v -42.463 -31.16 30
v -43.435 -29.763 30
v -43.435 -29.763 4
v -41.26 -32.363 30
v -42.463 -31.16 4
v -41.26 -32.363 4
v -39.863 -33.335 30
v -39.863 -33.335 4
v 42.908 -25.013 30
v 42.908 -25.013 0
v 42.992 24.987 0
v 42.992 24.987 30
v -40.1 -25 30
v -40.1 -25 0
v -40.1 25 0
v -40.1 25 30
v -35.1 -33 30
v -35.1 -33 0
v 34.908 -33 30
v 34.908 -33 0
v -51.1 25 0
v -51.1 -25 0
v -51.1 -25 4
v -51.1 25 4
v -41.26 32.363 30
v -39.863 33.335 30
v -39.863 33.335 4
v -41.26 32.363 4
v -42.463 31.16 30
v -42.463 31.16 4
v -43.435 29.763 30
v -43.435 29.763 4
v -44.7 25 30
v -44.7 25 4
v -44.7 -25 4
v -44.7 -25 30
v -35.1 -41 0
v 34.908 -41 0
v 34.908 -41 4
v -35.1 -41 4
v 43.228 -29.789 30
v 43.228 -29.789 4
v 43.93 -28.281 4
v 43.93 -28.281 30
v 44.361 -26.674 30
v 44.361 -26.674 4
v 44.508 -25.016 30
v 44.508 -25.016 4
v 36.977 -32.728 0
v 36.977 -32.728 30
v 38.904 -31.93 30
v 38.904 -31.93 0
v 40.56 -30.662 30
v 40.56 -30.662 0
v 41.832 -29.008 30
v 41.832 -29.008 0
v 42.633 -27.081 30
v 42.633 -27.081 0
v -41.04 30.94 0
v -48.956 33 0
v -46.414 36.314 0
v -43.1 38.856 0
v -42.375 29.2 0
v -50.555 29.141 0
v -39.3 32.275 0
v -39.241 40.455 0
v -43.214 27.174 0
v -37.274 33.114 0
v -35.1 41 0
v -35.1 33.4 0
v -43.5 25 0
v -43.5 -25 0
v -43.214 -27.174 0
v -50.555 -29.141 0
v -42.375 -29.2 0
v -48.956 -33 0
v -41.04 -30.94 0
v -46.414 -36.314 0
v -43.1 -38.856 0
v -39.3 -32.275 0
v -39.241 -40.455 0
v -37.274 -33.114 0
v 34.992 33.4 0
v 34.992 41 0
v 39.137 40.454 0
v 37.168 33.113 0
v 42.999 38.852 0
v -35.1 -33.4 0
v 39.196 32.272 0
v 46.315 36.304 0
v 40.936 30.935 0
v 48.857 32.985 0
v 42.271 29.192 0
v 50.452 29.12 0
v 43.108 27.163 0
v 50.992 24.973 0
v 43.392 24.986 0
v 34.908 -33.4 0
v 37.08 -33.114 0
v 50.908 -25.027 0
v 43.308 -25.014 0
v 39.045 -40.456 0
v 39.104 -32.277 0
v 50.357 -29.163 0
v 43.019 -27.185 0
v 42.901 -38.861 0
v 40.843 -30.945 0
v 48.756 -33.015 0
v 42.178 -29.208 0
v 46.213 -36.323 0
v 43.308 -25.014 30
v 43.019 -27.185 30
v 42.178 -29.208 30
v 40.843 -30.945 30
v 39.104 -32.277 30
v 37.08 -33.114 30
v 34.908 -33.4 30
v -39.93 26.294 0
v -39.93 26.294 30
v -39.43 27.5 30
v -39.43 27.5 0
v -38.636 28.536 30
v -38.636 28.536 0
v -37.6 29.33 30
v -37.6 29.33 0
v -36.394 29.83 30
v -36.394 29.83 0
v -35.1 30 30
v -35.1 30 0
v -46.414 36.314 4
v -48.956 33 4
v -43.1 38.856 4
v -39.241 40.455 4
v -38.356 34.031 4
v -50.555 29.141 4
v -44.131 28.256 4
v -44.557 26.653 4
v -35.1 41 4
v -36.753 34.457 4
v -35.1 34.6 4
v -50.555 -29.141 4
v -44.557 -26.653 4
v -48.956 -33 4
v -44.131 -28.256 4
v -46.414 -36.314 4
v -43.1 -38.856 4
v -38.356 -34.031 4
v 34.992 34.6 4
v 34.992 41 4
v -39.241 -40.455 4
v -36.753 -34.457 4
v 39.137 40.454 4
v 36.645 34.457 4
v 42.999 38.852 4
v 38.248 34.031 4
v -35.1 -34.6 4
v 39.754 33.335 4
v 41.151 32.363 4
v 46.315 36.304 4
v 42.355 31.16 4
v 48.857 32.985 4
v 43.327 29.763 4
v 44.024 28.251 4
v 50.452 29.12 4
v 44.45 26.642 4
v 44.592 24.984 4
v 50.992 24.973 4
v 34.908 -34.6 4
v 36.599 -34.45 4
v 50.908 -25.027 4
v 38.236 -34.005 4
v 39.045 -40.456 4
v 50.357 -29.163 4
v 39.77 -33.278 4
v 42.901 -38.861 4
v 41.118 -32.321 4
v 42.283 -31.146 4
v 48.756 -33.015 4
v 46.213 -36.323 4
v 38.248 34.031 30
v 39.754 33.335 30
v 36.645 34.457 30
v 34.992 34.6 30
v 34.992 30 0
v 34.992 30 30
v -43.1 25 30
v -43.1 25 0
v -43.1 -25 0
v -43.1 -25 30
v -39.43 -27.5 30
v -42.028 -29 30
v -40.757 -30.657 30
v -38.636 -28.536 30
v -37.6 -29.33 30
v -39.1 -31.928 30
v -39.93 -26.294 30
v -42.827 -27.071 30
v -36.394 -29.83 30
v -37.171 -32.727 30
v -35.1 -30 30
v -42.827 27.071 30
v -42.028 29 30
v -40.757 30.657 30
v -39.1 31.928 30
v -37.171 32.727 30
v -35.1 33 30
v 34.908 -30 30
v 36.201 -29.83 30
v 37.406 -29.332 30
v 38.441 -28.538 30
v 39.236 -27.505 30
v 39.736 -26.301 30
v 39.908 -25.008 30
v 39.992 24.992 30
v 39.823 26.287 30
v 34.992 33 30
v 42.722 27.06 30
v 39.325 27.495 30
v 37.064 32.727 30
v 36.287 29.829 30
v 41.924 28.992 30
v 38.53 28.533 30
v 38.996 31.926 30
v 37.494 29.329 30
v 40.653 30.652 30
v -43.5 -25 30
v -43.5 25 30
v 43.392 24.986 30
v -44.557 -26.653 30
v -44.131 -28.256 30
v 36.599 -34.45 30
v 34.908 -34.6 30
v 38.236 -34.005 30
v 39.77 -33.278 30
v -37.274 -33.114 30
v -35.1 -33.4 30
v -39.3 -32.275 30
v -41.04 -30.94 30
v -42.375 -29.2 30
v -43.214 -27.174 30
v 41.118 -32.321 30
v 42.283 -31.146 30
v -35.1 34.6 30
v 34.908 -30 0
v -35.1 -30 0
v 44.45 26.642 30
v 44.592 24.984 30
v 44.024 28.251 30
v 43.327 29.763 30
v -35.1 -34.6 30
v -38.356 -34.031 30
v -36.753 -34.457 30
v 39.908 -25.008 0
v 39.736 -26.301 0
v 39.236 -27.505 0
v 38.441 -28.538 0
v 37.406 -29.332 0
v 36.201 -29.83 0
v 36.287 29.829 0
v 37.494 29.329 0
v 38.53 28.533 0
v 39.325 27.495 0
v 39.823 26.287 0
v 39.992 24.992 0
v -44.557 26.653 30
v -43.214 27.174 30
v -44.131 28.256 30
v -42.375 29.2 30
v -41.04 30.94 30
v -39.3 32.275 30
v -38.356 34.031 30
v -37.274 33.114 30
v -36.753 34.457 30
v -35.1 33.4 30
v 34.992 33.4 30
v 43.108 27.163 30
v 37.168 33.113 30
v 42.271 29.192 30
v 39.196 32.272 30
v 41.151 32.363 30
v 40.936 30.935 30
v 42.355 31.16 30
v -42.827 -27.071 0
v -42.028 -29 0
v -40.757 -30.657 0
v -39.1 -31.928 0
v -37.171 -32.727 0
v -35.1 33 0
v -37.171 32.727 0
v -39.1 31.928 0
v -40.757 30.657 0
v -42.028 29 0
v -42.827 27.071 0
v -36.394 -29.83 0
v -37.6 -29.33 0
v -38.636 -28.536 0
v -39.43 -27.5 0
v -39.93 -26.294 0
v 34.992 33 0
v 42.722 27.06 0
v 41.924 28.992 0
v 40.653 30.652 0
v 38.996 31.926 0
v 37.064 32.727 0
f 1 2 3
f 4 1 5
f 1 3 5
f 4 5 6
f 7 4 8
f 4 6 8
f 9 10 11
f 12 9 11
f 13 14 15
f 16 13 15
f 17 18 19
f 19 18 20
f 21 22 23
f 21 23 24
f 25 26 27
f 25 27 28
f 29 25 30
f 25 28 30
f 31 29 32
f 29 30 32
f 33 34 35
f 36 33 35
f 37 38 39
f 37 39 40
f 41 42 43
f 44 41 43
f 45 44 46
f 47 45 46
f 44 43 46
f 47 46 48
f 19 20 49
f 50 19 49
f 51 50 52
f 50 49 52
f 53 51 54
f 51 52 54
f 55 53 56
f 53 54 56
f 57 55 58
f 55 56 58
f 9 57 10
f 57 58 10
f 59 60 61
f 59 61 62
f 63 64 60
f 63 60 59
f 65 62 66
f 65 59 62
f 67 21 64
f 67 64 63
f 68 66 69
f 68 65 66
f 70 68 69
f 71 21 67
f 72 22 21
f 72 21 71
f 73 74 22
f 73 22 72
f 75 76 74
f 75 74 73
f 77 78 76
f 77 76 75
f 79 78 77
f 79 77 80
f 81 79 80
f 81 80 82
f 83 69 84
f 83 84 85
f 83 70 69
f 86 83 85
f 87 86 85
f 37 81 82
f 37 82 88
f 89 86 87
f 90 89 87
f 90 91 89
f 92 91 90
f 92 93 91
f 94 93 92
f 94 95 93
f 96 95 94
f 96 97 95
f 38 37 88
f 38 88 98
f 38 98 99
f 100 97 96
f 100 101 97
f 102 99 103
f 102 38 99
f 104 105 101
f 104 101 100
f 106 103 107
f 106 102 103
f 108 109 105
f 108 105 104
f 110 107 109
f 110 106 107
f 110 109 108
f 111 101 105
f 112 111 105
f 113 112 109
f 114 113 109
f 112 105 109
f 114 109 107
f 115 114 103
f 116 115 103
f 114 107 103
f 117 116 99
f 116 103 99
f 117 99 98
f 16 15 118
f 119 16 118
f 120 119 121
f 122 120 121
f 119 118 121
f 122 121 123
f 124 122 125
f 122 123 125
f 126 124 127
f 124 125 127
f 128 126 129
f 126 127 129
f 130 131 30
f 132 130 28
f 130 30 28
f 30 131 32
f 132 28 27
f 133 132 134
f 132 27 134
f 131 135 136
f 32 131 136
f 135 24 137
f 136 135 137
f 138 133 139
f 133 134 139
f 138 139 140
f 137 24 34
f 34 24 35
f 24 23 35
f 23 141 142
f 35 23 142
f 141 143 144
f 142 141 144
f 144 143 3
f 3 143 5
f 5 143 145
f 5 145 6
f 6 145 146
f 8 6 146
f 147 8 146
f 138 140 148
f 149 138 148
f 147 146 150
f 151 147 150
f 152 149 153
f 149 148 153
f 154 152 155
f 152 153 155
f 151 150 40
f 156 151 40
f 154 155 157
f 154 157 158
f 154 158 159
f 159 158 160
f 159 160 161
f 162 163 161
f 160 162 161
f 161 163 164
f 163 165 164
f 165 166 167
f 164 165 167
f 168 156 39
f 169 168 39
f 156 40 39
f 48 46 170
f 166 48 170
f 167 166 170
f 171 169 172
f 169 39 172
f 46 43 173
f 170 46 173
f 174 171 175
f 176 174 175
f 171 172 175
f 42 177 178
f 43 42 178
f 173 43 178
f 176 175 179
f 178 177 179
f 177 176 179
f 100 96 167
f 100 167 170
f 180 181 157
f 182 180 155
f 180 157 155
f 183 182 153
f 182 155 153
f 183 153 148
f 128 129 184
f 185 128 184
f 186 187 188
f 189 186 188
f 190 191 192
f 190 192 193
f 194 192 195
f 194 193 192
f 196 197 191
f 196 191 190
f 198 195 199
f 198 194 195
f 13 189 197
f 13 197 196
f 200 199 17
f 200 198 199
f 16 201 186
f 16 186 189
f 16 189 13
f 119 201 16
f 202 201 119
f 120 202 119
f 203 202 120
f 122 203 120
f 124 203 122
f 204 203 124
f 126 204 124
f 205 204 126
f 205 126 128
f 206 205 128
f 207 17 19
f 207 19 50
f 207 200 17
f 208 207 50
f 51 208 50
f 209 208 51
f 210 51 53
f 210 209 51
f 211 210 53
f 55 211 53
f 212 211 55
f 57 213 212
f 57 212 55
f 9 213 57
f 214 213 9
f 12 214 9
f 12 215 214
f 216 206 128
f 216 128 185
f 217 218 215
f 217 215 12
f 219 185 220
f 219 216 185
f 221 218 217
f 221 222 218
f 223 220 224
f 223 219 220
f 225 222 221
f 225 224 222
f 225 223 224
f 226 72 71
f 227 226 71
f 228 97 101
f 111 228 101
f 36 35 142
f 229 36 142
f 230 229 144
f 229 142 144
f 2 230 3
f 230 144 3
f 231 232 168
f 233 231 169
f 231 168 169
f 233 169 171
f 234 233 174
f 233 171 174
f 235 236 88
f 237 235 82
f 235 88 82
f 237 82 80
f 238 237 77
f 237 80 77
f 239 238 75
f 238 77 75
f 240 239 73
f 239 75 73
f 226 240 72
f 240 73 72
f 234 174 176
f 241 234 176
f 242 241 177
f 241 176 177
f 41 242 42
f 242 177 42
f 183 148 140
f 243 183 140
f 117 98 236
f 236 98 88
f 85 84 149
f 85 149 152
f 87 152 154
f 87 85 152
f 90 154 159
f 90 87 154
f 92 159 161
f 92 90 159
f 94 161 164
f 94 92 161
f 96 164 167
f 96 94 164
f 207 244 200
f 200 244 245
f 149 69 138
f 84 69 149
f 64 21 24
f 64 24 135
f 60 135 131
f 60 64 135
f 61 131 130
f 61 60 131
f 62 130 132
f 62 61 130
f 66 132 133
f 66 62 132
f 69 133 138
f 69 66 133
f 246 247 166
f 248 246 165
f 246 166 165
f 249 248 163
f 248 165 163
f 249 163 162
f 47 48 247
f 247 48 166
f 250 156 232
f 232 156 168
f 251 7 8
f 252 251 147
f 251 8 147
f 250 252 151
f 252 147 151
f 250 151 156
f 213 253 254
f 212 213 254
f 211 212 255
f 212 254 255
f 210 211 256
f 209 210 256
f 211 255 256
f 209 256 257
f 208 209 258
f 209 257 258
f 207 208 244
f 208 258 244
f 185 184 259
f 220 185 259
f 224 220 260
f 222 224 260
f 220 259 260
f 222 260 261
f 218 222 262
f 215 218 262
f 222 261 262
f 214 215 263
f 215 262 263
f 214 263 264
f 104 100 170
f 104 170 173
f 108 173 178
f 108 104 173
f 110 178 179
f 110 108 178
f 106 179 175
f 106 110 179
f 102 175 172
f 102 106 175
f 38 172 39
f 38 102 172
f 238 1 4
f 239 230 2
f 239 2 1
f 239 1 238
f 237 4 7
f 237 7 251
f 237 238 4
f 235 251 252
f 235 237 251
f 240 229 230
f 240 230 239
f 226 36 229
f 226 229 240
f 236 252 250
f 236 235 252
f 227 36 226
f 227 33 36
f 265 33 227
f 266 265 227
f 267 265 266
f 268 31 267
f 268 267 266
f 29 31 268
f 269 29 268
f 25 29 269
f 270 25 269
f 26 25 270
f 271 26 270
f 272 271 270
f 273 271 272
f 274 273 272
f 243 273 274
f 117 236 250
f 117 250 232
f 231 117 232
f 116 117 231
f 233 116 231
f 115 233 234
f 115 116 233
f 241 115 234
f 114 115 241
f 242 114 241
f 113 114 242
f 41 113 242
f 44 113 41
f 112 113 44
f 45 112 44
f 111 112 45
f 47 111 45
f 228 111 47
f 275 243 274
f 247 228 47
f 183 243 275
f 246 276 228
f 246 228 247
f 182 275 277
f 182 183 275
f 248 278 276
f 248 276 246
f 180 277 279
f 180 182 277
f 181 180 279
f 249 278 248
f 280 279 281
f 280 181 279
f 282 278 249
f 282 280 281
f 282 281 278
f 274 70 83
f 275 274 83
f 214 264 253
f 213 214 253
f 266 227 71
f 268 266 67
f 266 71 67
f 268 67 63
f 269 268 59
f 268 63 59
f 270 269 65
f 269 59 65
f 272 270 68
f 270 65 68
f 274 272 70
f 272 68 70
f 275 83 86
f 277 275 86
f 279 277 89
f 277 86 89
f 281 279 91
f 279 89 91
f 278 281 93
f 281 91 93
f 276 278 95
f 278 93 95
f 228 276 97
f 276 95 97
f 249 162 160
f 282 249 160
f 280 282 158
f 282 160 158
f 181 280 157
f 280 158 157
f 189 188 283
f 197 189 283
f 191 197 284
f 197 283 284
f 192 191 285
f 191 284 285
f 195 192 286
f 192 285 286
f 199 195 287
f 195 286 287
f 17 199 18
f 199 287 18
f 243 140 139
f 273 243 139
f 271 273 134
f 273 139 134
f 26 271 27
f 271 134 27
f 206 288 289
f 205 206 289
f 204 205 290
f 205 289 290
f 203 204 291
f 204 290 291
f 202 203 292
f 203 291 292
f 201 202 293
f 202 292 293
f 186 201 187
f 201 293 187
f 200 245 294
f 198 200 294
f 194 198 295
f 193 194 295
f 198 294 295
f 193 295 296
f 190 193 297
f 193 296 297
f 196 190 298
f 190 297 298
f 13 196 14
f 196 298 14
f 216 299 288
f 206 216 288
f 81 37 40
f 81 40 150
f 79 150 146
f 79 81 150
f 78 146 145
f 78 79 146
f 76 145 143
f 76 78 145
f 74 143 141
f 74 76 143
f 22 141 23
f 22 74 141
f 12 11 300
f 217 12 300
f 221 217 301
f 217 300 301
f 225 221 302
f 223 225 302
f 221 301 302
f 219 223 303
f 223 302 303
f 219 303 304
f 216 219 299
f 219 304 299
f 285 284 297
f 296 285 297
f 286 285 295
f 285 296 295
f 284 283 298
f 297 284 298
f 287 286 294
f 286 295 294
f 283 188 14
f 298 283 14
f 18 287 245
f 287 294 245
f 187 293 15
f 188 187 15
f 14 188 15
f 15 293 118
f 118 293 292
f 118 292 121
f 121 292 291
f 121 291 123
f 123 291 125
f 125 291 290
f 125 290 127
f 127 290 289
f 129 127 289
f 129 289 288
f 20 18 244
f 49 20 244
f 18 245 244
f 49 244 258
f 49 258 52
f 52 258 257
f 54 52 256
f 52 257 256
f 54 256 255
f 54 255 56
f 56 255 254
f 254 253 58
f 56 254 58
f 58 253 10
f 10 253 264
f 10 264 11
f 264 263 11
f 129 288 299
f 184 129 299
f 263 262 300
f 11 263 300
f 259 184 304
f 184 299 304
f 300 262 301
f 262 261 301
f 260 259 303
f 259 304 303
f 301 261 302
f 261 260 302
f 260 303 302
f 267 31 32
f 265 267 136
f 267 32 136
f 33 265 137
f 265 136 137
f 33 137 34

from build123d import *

# Parameters (mm, degrees)
F1_DEPTH = 30
F2_DEPTH = 30
F4_DEPTH = 4


# Not quite as in the source:
# - a feature of the source that left no trace in its solid (it failed there, or was rolled back) is left out


with BuildPart() as f1:
    # F0 (on Top) → F1 (new body)
    with BuildSketch(Plane.XY):
        with BuildLine():
            Line((34.9916597222, 33), (-35.1, 33))
            ThreePointArc((-35.1, 33), (-40.7568542495, 30.6568542495), (-43.1, 25))
            Line((-43.1, 25), (-43.1, -25))
            ThreePointArc((-43.1, -25), (-40.7568542495, -30.6568542495), (-35.1, -33))
            Line((-35.1, -33), (34.9083263889, -33))
            ThreePointArc((34.9083263889, -33), (40.5604646339, -30.6615663256), (42.9083152778, -25.0133333148))
            Line((42.9083152778, -25.0133333148), (42.9916486111, 24.9866666852))
            ThreePointArc((42.9916486111, 24.9866666852), (40.6532260478, 30.652138245), (34.9916597222, 33))
        make_face()
        with BuildLine():
            Line((34.9083263889, -30), (-35.1, -30))
            ThreePointArc((-35.1, -30), (-38.6355339059, -28.5355339059), (-40.1, -25))
            Line((-40.1, -25), (-40.1, 25))
            ThreePointArc((-40.1, 25), (-38.6355339059, 28.5355339059), (-35.1, 30))
            Line((-35.1, 30), (34.9916597222, 30))
            ThreePointArc((34.9916597222, 30), (38.5301386757, 28.5325864031), (39.9916527778, 24.9916666782))
            Line((39.9916527778, 24.9916666782), (39.9083194445, -25.0083333218))
            ThreePointArc((39.9083194445, -25.0083333218), (38.440912792, -28.5384789535), (34.9083263889, -30))
        make_face(mode=Mode.SUBTRACT)
    extrude(amount=F1_DEPTH)


with BuildPart() as f2:
    # F0 (on Top) → F2 (new body)
    with BuildSketch(Plane.XY):
        with BuildLine():
            ThreePointArc((-43.4353358825, 29.7625807841), (-41.1644660941, 31.0644660941), (-39.8625807841, 33.3353358825))
            ThreePointArc((-39.8625807841, 33.3353358825), (-41.8882250994, 31.7882250994), (-43.4353358825, 29.7625807841))
        make_face()
        with BuildLine():
            ThreePointArc((-39.8625807841, -33.3353358825), (-41.1644660941, -31.0644660941), (-43.4353358825, -29.7625807841))
            ThreePointArc((-43.4353358825, -29.7625807841), (-41.8882250994, -31.7882250994), (-39.8625807841, -33.3353358825))
        make_face()
        with BuildLine():
            ThreePointArc((43.3269979462, 29.7625766863), (41.7798801076, 31.7882298134), (39.7542248316, 33.3353448386))
            ThreePointArc((39.7542248316, 33.3353448386), (41.0561149382, 31.0644636388), (43.3269979462, 29.7625766863))
        make_face()
        with BuildLine():
            ThreePointArc((39.7695232115, -33.2782102807), (41.7258186338, -31.7588312222), (43.228235626, -29.7894791247))
            ThreePointArc((43.228235626, -29.7894791247), (41.040869178, -31.0797754051), (39.7695232115, -33.2782102807))
        make_face()
        with BuildLine():
            Line((34.9916597222, 34.6), (-35.1, 34.6))
            ThreePointArc((-35.1, 34.6), (-37.5638156919, 34.2784488055), (-39.8625807841, 33.3353358825))
            ThreePointArc((-39.8625807841, 33.3353358825), (-41.1644660941, 31.0644660941), (-43.4353358825, 29.7625807841))
            ThreePointArc((-43.4353358825, 29.7625807841), (-44.3784488055, 27.4638156919), (-44.7, 25))
            Line((-44.7, 25), (-44.7, -25))
            ThreePointArc((-44.7, -25), (-44.3784488055, -27.4638156919), (-43.4353358825, -29.7625807841))
            ThreePointArc((-43.4353358825, -29.7625807841), (-41.1644660941, -31.0644660941), (-39.8625807841, -33.3353358825))
            ThreePointArc((-39.8625807841, -33.3353358825), (-37.5638156919, -34.2784488055), (-35.1, -34.6))
            Line((-35.1, -34.6), (34.9083263889, -34.6))
            ThreePointArc((34.9083263889, -34.6), (37.4271734769, -34.2636606883), (39.7695232115, -33.2782102807))
            ThreePointArc((39.7695232115, -33.2782102807), (41.040869178, -31.0797754051), (43.228235626, -29.7894791247))
            ThreePointArc((43.228235626, -29.7894791247), (44.1807151368, -27.4865250667), (44.5083130556, -25.0159999778))
            Line((44.5083130556, -25.0159999778), (44.5916463889, 24.9840000222))
            ThreePointArc((44.5916463889, 24.9840000222), (44.2721590874, 27.4560805226), (43.3269979462, 29.7625766863))
            ThreePointArc((43.3269979462, 29.7625766863), (41.0561149382, 31.0644636388), (39.7542248316, 33.3353448386))
            ThreePointArc((39.7542248316, 33.3353448386), (37.45546669, 34.2784511221), (34.9916597222, 34.6))
        make_face()
        with BuildLine():
            ThreePointArc((-43.5, 25), (-41.039696962, 30.939696962), (-35.1, 33.4))
            Line((-35.1, 33.4), (34.9916597222, 33.4))
            ThreePointArc((34.9916597222, 33.4), (40.9363043641, 30.9347451573), (43.3916480556, 24.9860000194))
            Line((43.3916480556, 24.9860000194), (43.3083147223, -25.0139999806))
            ThreePointArc((43.3083147223, -25.0139999806), (40.8430715462, -30.9446446419), (34.9083263889, -33.4))
            Line((34.9083263889, -33.4), (-35.1, -33.4))
            ThreePointArc((-35.1, -33.4), (-41.039696962, -30.939696962), (-43.5, -25))
            Line((-43.5, -25), (-43.5, 25))
        make_face(mode=Mode.SUBTRACT)
    extrude(amount=F2_DEPTH)

    # F3 (on face) → F4 (join)
    with BuildSketch(Plane(origin=(0, 0, 0), x_dir=(1, 0, 0), z_dir=(0, 0, -1))):
        with BuildLine():
            ThreePointArc((-35.1, 41), (-46.413708499, 36.313708499), (-51.1, 25))
            Line((-51.1, 25), (-51.1, -25))
            ThreePointArc((-51.1, -25), (-46.413708499, -36.313708499), (-35.1, -41))
            Line((-35.1, -41), (34.9916597222, -41))
            ThreePointArc((34.9916597222, -41), (46.3147923734, -36.30427649), (50.9916375001, -24.9733333704))
            Line((50.9916375001, -24.9733333704), (50.9083041667, 25.0266666296))
            ThreePointArc((50.9083041667, 25.0266666296), (46.2126028789, 36.3231326512), (34.9083263889, 41))
            Line((34.9083263889, 41), (-35.1, 41))
        make_face()
        with BuildLine():
            Line((-44.7, -25), (-44.7, 25))
            ThreePointArc((-44.7, 25), (-41.8882250994, 31.7882250994), (-35.1, 34.6))
            Line((-35.1, 34.6), (34.9083263889, 34.6))
            ThreePointArc((34.9083263889, 34.6), (41.6908922829, 31.7938795907), (44.5083130556, 25.0159999778))
            Line((44.5083130556, 25.0159999778), (44.5916463889, -24.9840000222))
            ThreePointArc((44.5916463889, -24.9840000222), (41.785539313, -31.782565894), (34.9916597222, -34.6))
            Line((34.9916597222, -34.6), (-35.1, -34.6))
            ThreePointArc((-35.1, -34.6), (-41.8882250994, -31.7882250994), (-44.7, -25))
        make_face(mode=Mode.SUBTRACT)
    extrude(amount=-F4_DEPTH)


solid = Compound([f1.part, f2.part])
